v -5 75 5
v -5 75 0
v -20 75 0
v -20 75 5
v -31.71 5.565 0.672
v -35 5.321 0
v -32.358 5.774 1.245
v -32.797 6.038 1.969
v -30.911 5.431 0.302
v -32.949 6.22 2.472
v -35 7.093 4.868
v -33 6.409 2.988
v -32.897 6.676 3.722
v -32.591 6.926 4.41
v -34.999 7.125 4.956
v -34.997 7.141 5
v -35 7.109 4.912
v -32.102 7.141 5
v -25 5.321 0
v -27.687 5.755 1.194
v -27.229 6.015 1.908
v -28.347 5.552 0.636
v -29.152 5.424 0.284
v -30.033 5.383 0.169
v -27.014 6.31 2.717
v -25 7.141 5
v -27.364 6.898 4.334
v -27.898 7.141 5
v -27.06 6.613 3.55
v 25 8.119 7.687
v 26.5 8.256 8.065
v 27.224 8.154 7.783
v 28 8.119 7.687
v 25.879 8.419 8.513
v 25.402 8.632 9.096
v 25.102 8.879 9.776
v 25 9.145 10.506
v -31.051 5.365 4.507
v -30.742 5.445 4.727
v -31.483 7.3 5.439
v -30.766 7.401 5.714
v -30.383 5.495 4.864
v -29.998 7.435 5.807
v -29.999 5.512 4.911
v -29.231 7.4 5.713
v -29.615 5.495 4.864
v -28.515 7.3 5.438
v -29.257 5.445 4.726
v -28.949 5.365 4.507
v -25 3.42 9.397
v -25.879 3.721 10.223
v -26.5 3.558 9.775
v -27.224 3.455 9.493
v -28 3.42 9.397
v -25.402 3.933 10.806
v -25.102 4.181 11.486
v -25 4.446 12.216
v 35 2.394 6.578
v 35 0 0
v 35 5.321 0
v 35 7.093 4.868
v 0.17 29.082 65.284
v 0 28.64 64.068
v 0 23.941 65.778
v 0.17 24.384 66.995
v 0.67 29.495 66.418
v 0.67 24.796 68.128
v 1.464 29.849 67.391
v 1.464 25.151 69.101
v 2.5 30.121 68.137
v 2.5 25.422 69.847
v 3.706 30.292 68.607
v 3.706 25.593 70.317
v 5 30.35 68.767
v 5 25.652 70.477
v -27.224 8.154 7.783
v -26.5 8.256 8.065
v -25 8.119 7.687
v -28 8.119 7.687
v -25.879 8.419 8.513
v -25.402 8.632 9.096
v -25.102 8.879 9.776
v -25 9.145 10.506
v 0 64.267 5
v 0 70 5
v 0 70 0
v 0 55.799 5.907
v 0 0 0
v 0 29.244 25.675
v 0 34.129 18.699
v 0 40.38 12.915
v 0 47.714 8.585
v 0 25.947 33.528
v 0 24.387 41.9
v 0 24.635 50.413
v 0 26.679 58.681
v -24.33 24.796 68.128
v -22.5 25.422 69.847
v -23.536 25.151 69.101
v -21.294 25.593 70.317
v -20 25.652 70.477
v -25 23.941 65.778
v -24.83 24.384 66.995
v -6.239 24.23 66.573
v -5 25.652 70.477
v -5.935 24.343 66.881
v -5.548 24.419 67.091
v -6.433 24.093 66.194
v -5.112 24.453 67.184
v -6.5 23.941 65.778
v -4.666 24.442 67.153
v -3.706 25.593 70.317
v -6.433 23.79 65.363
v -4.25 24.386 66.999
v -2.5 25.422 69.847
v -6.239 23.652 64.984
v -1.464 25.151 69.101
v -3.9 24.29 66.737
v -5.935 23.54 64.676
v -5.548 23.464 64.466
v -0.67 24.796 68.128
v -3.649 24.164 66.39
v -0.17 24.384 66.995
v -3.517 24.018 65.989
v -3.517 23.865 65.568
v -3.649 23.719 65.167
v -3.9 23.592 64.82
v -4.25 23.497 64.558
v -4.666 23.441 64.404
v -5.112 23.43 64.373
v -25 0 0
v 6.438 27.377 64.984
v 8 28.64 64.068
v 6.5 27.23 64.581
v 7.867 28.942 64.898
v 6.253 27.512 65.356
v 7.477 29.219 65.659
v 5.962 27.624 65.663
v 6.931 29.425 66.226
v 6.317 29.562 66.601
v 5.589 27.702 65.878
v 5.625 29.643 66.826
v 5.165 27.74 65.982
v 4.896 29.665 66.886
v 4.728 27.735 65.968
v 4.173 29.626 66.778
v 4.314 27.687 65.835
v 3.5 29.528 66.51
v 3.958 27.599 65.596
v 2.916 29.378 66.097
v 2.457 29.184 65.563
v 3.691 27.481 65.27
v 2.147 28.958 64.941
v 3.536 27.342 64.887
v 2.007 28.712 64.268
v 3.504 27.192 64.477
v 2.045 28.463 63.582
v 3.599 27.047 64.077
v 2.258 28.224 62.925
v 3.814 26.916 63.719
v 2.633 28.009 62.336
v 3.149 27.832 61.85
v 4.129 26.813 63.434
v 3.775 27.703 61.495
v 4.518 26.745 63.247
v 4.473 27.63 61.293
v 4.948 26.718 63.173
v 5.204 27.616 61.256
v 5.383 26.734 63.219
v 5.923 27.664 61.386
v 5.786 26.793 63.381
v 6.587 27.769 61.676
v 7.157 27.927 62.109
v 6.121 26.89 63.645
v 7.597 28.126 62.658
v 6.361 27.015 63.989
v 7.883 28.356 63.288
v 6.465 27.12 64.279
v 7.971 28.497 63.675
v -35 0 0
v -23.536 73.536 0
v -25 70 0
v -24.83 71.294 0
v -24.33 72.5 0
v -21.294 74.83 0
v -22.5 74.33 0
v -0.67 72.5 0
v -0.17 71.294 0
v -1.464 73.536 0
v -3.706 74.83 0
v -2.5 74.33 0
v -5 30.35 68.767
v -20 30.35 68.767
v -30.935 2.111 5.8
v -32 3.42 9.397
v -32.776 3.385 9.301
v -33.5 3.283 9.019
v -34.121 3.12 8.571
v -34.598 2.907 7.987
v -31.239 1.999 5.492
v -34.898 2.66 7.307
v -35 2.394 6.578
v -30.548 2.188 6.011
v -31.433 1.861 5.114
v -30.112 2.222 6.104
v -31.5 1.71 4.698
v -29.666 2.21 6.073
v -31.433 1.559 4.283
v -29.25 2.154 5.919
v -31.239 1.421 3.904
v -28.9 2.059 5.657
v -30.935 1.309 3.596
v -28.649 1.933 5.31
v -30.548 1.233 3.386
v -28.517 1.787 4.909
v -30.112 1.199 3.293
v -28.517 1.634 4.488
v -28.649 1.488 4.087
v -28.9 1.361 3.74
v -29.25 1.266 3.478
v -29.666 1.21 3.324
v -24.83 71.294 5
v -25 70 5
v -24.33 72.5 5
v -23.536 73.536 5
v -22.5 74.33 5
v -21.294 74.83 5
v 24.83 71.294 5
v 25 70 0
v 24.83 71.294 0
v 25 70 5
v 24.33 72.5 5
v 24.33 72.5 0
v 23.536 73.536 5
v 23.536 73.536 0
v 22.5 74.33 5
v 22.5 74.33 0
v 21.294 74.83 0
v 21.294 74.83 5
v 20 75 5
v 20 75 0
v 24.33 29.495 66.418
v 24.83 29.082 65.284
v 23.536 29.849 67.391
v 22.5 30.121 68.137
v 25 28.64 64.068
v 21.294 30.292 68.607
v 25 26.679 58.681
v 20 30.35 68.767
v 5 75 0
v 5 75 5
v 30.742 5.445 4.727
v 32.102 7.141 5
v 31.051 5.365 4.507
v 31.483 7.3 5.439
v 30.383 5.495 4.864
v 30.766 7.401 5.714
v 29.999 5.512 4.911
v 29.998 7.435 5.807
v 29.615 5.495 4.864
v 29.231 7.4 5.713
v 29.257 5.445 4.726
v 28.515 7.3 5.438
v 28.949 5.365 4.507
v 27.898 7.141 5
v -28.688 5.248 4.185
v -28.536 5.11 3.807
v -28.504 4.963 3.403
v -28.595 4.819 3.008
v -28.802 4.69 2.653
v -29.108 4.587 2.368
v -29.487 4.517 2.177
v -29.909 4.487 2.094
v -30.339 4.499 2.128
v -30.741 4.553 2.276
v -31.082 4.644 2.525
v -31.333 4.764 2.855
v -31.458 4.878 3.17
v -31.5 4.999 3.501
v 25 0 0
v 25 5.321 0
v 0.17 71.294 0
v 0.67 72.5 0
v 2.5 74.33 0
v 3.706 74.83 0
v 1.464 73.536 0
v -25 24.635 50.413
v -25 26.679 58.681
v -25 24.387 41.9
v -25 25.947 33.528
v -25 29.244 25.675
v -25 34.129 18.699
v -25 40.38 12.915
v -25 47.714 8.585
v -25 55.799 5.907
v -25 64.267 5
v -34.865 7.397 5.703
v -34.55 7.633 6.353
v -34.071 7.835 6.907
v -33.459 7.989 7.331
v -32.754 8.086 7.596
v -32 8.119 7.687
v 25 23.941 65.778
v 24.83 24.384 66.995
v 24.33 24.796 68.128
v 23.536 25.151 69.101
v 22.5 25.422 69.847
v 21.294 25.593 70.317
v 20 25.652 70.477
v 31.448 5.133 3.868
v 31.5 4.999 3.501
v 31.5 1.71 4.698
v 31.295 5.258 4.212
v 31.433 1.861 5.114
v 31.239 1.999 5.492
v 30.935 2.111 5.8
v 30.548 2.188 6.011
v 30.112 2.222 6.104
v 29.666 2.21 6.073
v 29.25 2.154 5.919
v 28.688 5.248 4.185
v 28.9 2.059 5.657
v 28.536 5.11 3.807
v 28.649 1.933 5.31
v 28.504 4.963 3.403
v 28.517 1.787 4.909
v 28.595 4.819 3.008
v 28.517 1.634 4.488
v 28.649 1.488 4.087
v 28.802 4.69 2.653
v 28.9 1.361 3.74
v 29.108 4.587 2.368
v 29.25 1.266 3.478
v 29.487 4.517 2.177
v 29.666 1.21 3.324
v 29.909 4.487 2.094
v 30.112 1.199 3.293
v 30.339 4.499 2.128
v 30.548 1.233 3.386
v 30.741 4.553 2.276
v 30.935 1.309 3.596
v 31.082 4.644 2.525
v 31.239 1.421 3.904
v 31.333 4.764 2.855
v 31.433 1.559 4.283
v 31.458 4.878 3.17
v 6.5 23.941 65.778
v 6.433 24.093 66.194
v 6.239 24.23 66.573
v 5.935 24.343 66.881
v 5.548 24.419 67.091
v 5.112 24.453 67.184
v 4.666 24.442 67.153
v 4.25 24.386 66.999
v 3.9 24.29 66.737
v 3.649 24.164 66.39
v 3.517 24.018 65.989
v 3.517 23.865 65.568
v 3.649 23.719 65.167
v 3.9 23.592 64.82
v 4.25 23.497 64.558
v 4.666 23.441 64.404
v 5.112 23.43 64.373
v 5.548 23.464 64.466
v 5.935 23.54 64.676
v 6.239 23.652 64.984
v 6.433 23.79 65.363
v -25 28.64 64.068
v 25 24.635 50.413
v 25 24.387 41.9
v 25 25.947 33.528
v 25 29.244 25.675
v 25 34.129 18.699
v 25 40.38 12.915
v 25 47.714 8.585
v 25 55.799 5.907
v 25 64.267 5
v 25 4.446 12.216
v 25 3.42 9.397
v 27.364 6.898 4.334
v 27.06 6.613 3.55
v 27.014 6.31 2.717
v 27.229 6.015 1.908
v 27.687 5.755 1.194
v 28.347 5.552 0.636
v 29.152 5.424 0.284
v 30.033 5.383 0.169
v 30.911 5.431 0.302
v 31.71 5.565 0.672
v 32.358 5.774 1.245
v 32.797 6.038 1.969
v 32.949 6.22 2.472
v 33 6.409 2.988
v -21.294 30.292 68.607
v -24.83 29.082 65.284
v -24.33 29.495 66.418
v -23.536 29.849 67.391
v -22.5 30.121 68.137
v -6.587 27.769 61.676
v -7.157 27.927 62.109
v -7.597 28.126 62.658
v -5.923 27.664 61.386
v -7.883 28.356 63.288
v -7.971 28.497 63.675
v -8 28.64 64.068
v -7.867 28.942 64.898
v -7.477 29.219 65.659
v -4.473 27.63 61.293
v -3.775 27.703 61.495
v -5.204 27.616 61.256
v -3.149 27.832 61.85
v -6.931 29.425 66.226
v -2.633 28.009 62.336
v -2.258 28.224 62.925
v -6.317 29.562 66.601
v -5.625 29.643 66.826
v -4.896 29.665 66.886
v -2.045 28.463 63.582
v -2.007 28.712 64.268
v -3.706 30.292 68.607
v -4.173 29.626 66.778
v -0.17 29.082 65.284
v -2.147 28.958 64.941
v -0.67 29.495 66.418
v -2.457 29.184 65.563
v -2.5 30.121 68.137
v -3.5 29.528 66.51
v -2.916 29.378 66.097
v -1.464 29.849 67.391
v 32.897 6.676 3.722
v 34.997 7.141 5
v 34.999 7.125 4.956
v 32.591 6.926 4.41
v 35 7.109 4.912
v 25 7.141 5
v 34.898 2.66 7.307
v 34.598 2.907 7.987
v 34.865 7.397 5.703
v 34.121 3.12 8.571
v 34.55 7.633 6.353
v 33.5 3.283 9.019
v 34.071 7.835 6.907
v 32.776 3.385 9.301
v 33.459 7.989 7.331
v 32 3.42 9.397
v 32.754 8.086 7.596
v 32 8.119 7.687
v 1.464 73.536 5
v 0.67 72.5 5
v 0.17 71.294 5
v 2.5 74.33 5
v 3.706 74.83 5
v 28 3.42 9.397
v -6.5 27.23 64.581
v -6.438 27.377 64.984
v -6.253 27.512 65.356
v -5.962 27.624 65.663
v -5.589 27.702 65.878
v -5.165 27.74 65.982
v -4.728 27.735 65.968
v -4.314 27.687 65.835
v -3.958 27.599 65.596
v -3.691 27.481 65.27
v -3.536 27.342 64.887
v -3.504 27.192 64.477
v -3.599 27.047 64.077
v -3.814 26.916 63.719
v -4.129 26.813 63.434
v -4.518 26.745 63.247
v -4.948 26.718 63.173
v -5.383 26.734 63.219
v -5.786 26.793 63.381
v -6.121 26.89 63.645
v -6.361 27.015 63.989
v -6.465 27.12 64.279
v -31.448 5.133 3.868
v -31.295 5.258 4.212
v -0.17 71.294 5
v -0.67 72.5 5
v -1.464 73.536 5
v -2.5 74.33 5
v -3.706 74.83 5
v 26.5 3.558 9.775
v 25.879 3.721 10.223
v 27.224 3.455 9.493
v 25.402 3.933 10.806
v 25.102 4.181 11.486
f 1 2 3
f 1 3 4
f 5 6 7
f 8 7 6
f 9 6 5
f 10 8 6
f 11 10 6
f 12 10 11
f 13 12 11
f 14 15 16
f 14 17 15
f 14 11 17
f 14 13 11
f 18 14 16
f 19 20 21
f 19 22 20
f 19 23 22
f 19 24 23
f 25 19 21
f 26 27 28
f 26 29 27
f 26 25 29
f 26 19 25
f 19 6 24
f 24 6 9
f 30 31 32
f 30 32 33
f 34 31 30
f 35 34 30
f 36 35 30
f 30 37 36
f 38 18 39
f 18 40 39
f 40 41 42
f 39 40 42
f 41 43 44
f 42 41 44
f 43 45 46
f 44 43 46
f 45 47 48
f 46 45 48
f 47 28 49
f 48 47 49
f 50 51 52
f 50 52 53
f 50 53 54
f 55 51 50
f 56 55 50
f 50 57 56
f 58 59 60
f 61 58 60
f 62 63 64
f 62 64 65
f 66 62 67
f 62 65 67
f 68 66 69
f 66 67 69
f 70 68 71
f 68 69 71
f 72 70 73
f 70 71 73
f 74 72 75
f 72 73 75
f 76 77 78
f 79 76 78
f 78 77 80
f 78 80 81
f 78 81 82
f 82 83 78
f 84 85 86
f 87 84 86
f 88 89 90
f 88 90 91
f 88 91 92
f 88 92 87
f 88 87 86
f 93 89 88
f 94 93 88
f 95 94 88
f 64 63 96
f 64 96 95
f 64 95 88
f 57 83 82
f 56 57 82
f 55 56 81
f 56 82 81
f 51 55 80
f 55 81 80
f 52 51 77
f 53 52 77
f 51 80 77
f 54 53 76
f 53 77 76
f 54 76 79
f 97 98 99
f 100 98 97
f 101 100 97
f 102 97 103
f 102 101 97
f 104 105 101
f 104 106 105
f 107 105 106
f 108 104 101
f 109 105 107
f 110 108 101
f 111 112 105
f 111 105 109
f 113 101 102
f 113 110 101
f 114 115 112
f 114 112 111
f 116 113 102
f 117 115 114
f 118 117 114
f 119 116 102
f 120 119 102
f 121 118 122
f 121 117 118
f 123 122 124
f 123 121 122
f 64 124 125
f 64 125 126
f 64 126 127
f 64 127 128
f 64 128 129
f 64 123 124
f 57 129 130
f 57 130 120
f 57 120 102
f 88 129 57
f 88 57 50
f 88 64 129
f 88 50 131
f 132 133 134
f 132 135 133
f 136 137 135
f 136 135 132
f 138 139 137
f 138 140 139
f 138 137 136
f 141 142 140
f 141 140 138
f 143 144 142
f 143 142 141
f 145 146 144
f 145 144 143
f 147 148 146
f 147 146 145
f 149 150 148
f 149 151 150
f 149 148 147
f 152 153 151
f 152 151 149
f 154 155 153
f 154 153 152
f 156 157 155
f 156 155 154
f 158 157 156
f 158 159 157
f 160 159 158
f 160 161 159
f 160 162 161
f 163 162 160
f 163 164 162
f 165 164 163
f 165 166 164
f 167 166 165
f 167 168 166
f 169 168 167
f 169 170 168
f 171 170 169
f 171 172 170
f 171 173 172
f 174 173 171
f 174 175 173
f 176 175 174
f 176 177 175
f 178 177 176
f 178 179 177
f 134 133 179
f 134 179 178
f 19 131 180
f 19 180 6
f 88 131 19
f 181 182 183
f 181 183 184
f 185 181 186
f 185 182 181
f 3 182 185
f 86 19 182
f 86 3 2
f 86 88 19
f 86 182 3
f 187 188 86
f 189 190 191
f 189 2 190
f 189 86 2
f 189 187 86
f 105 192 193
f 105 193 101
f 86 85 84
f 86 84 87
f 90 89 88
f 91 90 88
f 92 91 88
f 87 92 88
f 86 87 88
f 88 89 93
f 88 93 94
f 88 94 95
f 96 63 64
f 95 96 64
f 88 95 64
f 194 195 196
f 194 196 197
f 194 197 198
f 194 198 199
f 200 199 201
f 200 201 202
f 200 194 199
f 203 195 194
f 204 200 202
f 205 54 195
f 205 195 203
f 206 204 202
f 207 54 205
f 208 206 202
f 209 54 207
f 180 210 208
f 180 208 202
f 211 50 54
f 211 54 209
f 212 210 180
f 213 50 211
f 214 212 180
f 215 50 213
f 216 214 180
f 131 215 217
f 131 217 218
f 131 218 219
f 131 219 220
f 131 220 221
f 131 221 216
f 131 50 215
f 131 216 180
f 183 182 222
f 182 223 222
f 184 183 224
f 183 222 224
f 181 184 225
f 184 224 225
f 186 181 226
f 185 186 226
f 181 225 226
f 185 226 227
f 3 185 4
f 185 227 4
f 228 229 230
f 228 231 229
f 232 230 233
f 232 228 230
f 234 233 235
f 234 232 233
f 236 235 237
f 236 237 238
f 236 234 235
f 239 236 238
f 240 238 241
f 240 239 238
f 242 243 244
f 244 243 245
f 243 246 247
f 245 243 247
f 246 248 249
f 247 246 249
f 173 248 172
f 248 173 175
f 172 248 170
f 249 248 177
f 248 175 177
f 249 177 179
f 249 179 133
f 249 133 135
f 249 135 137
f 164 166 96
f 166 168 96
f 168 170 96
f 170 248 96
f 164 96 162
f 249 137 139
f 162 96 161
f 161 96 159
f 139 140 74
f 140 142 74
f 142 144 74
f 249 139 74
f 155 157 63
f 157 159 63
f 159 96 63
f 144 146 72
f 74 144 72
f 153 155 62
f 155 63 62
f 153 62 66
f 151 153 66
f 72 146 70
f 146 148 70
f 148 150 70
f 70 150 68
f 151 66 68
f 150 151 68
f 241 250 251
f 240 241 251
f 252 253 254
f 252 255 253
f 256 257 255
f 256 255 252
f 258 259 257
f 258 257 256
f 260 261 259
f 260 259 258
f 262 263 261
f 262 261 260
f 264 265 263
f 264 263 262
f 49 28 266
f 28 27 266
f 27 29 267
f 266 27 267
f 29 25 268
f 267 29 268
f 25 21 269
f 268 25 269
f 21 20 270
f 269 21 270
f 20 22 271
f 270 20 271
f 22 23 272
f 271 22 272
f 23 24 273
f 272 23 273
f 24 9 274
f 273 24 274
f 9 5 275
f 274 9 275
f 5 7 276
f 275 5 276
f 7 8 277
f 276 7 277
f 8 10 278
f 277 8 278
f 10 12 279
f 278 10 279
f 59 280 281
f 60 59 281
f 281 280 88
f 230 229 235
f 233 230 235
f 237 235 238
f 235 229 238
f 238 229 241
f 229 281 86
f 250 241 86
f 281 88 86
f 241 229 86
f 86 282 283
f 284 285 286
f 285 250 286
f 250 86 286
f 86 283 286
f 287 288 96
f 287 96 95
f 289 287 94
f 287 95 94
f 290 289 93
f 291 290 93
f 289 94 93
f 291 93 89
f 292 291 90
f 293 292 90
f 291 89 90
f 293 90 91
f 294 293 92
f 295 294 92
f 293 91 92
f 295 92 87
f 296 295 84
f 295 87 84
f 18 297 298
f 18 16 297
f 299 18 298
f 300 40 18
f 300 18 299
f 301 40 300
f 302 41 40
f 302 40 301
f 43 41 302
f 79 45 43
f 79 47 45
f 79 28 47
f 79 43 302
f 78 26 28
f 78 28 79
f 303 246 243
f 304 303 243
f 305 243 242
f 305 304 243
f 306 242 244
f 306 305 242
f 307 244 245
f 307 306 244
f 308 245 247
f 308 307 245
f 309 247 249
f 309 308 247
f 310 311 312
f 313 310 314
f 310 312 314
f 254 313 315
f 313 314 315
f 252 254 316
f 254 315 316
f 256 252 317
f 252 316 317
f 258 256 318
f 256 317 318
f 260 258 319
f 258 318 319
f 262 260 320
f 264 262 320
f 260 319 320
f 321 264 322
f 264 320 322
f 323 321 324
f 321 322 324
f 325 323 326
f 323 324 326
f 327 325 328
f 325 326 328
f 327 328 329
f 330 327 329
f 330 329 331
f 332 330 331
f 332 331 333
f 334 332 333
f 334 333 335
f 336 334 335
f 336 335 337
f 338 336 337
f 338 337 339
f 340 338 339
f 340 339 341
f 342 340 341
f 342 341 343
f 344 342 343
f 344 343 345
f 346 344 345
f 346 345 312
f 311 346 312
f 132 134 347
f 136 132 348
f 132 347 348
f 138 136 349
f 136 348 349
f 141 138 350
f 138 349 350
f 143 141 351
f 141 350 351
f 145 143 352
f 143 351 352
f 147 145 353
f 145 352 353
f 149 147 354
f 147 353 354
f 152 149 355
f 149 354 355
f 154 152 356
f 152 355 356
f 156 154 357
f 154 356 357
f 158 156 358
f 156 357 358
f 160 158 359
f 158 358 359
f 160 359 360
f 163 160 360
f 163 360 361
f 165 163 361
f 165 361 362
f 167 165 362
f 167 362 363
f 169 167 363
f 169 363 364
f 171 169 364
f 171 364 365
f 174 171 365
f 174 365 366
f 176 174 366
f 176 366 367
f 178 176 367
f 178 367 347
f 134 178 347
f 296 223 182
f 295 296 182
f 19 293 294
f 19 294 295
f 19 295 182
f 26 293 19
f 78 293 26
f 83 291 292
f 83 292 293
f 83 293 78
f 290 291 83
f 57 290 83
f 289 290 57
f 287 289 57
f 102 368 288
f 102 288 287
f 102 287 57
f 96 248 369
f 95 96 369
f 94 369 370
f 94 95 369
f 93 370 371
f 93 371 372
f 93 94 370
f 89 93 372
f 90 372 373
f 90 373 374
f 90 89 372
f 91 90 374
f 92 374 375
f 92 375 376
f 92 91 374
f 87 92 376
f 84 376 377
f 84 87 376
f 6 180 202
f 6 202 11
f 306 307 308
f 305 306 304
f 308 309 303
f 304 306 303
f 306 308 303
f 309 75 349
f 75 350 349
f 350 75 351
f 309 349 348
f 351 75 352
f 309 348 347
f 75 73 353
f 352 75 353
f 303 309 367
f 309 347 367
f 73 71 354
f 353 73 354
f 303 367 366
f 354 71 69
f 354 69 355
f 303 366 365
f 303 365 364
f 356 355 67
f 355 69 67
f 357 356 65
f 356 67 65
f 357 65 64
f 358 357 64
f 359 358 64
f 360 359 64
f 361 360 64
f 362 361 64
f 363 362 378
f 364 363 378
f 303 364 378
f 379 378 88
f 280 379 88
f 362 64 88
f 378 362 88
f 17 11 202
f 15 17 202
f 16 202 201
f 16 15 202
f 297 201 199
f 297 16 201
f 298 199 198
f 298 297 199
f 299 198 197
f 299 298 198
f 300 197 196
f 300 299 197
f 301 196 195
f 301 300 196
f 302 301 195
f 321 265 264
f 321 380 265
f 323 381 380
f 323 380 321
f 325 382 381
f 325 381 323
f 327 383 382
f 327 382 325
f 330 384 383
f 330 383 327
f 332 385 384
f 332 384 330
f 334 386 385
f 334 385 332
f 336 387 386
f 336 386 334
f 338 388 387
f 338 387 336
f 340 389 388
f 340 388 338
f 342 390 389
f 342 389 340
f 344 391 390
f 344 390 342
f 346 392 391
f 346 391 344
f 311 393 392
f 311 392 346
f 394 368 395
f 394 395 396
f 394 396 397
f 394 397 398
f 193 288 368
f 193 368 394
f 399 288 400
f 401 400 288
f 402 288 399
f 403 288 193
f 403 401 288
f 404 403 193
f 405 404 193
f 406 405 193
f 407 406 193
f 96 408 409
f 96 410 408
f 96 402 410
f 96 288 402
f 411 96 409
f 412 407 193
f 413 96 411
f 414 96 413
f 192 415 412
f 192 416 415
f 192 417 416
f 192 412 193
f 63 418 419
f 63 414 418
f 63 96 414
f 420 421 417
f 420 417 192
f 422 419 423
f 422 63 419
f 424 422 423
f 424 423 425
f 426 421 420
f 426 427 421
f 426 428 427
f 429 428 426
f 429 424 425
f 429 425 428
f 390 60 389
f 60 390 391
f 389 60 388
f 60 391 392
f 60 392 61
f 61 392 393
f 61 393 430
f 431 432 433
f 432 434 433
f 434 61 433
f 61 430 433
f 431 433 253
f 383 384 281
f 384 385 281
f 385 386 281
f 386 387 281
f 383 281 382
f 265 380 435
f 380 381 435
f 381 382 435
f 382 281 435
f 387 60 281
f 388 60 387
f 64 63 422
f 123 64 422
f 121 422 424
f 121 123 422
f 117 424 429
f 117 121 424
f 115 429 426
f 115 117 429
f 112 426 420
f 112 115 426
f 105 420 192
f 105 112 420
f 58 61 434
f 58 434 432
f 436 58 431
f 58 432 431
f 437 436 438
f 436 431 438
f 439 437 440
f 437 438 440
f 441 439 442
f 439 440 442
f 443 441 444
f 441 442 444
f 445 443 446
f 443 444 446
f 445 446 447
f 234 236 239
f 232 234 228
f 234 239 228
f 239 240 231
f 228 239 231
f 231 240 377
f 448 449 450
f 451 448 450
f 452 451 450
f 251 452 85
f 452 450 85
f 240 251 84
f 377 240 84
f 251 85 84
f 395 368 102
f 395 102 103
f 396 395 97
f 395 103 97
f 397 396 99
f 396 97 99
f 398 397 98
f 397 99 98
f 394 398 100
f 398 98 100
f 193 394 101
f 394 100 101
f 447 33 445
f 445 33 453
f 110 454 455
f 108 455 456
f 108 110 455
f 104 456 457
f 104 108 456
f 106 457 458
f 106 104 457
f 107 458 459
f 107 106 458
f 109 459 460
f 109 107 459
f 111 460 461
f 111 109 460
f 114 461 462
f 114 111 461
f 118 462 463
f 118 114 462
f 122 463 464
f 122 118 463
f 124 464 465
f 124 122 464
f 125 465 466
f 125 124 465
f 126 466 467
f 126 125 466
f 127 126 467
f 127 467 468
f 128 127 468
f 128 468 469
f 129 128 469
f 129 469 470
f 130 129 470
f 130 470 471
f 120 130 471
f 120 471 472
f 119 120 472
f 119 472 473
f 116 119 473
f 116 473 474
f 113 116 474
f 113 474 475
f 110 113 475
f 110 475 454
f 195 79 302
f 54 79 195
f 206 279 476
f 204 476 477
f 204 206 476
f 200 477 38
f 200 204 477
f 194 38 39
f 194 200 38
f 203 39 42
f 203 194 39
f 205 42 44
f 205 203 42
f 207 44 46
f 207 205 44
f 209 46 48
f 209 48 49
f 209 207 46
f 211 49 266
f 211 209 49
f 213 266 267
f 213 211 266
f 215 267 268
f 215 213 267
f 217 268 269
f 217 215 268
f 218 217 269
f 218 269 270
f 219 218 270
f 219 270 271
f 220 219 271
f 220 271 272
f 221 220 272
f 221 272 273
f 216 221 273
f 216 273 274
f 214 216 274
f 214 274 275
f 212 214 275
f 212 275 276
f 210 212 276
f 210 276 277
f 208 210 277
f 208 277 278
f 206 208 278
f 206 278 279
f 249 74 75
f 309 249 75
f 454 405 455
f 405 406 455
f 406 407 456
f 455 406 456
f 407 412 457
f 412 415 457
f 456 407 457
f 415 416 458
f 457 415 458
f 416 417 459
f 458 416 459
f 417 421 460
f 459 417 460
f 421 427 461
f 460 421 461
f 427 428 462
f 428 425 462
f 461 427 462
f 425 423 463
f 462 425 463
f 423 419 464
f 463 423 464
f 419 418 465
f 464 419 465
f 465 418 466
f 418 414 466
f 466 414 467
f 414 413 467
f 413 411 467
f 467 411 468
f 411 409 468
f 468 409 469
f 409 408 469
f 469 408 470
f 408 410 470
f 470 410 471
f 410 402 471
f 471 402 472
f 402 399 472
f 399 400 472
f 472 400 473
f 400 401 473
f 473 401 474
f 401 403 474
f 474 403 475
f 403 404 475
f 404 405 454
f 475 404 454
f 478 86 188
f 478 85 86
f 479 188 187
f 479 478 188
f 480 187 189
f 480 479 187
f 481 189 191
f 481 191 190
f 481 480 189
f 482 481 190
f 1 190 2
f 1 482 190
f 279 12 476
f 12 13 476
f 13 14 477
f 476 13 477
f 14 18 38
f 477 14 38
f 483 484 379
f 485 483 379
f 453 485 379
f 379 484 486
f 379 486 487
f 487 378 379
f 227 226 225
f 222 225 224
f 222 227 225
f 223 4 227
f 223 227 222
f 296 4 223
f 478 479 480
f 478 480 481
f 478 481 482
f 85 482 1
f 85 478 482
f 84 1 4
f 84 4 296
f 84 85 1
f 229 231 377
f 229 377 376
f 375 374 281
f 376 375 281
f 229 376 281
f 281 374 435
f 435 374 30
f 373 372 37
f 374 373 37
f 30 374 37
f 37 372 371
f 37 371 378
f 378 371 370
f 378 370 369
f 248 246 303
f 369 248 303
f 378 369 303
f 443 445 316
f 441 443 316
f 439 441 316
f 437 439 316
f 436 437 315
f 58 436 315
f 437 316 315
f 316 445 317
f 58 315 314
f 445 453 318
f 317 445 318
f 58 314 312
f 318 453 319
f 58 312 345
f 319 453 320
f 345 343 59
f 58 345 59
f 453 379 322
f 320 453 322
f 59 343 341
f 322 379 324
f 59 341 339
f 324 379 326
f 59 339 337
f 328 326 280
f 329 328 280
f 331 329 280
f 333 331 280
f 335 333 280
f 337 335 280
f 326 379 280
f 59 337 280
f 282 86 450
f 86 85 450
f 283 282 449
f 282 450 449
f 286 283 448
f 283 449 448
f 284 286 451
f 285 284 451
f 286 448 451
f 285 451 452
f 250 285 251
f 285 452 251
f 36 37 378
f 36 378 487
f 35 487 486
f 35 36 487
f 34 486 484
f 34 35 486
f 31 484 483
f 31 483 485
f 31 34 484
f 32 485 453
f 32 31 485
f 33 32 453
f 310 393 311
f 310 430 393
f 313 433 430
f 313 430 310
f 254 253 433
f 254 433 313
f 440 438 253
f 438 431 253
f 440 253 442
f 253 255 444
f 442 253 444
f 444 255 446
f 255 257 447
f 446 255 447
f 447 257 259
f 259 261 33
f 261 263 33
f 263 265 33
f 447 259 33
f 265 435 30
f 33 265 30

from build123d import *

# Parameters (mm, degrees)
F1_DEPTH    = 25
F3_DEPTH    = 10
F4_R        = 1.5
F5_DEPTH    = 25
F6_SIZE     = 1.5
F7_T1_DEPTH = 25
F8_R        = 5
F9_T1_DEPTH = 5
F9_T3_DEPTH = 20


# Not quite as in the source:
# - a fillet or chamfer that OpenCascade refuses, or shapes differently, is made with other operations: its cross-section is extruded or revolved along the edge and cut away or added
# - a feature names something its author has since deleted; it is built from what else it names


with BuildPart() as f1:
    # F0 (on Right) → F1 (new body)
    with BuildSketch(Plane.YZ):
        Polygon((25.6515107494, 70.4769465589), (0, 0), (75, 0), (75, 5), (7.1407400337, 5), (30.3499738534, 68.7668458423), align=None)
    extrude(amount=F1_DEPTH)

    # F2 (on face) → F3 (join)
    with BuildSketch(Plane.YZ.offset(25)):
        Polygon((8.1186645372, 7.6868254912), (3.4202014333, 9.3969262079), (0, 0), (5.3208888624, 0), (7.1407400337, 5), align=None)
    extrude(amount=F3_DEPTH)

    # F4 (on face) → F5 (cut)
    with BuildSketch(Plane(origin=(0, 0, 0), x_dir=(1, 0, 0), z_dir=(0, -0.9396926208, 0.3420201433))):
        with Locations((30, 5)):
            Circle(F4_R)
        with Locations((5, 70)):
            Circle(F4_R)
    extrude(amount=-F5_DEPTH, mode=Mode.SUBTRACT)

    # F6
    f6_edges = [f1.edges().sort_by_distance(p)[0] for p in [
        (28.5, 6.408564, 2.988362),
        (3.5, 28.639873, 64.068383),
    ]]
    chamfer(f6_edges, length=F6_SIZE)

    # F7: fillet of radius 40 on 1 edges, made by hand

    # F7_s2 → F7_t1 (join)
    with BuildSketch(Plane.YZ):
        with BuildLine():
            ThreePointArc((26.678955472, 58.680805733), (31.5005785318, 22.056942546), (64.2666603034, 5))
            Line((64.2666603034, 5), (7.1407400337, 5))
            Line((7.1407400337, 5), (26.678955472, 58.680805733))
        make_face()
    extrude(amount=F7_T1_DEPTH)

    # F8
    f8_edges = [f1.edges().sort_by_distance(p)[0] for p in [
        (25, 28.000742, 69.621896),
        (0, 28.000742, 69.621896),
        (0, 75, 2.5),
        (25, 75, 2.5),
    ]]
    fillet(f8_edges, radius=F8_R)

    # F9: fillet of radius 3 on 2 edges, made by hand

    # F9_s2 → F9_t1 (join)
    with BuildSketch(Plane(origin=(0, 4.6984631039, -1.7101007166), x_dir=(1, 0, 0), z_dir=(0, -0.9396926208, 0.3420201433))):
        with BuildLine():
            ThreePointArc((25, 13), (25.8786796564, 10.8786796564), (28, 10))
            Line((28, 10), (25, 10))
            Line((25, 10), (25, 13))
        make_face()
    extrude(amount=F9_T1_DEPTH)

    # F9_s4 → F9_t3 (cut)
    with BuildSketch(Plane(origin=(0, 11.7461577598, -4.2752517916), x_dir=(1, 0, 0), z_dir=(0, -0.9396926208, 0.3420201433))):
        with BuildLine():
            ThreePointArc((35, 7), (34.1213203436, 9.1213203436), (32, 10))
            Line((32, 10), (35, 10))
            Line((35, 10), (35, 7))
        make_face()
    extrude(amount=F9_T3_DEPTH, mode=Mode.SUBTRACT)


with BuildPart() as f10_1:
    # F10: instance of F1
    add(f1.part.mirror(Plane.YZ))


solid = Compound([f1.part, f10_1.part])
